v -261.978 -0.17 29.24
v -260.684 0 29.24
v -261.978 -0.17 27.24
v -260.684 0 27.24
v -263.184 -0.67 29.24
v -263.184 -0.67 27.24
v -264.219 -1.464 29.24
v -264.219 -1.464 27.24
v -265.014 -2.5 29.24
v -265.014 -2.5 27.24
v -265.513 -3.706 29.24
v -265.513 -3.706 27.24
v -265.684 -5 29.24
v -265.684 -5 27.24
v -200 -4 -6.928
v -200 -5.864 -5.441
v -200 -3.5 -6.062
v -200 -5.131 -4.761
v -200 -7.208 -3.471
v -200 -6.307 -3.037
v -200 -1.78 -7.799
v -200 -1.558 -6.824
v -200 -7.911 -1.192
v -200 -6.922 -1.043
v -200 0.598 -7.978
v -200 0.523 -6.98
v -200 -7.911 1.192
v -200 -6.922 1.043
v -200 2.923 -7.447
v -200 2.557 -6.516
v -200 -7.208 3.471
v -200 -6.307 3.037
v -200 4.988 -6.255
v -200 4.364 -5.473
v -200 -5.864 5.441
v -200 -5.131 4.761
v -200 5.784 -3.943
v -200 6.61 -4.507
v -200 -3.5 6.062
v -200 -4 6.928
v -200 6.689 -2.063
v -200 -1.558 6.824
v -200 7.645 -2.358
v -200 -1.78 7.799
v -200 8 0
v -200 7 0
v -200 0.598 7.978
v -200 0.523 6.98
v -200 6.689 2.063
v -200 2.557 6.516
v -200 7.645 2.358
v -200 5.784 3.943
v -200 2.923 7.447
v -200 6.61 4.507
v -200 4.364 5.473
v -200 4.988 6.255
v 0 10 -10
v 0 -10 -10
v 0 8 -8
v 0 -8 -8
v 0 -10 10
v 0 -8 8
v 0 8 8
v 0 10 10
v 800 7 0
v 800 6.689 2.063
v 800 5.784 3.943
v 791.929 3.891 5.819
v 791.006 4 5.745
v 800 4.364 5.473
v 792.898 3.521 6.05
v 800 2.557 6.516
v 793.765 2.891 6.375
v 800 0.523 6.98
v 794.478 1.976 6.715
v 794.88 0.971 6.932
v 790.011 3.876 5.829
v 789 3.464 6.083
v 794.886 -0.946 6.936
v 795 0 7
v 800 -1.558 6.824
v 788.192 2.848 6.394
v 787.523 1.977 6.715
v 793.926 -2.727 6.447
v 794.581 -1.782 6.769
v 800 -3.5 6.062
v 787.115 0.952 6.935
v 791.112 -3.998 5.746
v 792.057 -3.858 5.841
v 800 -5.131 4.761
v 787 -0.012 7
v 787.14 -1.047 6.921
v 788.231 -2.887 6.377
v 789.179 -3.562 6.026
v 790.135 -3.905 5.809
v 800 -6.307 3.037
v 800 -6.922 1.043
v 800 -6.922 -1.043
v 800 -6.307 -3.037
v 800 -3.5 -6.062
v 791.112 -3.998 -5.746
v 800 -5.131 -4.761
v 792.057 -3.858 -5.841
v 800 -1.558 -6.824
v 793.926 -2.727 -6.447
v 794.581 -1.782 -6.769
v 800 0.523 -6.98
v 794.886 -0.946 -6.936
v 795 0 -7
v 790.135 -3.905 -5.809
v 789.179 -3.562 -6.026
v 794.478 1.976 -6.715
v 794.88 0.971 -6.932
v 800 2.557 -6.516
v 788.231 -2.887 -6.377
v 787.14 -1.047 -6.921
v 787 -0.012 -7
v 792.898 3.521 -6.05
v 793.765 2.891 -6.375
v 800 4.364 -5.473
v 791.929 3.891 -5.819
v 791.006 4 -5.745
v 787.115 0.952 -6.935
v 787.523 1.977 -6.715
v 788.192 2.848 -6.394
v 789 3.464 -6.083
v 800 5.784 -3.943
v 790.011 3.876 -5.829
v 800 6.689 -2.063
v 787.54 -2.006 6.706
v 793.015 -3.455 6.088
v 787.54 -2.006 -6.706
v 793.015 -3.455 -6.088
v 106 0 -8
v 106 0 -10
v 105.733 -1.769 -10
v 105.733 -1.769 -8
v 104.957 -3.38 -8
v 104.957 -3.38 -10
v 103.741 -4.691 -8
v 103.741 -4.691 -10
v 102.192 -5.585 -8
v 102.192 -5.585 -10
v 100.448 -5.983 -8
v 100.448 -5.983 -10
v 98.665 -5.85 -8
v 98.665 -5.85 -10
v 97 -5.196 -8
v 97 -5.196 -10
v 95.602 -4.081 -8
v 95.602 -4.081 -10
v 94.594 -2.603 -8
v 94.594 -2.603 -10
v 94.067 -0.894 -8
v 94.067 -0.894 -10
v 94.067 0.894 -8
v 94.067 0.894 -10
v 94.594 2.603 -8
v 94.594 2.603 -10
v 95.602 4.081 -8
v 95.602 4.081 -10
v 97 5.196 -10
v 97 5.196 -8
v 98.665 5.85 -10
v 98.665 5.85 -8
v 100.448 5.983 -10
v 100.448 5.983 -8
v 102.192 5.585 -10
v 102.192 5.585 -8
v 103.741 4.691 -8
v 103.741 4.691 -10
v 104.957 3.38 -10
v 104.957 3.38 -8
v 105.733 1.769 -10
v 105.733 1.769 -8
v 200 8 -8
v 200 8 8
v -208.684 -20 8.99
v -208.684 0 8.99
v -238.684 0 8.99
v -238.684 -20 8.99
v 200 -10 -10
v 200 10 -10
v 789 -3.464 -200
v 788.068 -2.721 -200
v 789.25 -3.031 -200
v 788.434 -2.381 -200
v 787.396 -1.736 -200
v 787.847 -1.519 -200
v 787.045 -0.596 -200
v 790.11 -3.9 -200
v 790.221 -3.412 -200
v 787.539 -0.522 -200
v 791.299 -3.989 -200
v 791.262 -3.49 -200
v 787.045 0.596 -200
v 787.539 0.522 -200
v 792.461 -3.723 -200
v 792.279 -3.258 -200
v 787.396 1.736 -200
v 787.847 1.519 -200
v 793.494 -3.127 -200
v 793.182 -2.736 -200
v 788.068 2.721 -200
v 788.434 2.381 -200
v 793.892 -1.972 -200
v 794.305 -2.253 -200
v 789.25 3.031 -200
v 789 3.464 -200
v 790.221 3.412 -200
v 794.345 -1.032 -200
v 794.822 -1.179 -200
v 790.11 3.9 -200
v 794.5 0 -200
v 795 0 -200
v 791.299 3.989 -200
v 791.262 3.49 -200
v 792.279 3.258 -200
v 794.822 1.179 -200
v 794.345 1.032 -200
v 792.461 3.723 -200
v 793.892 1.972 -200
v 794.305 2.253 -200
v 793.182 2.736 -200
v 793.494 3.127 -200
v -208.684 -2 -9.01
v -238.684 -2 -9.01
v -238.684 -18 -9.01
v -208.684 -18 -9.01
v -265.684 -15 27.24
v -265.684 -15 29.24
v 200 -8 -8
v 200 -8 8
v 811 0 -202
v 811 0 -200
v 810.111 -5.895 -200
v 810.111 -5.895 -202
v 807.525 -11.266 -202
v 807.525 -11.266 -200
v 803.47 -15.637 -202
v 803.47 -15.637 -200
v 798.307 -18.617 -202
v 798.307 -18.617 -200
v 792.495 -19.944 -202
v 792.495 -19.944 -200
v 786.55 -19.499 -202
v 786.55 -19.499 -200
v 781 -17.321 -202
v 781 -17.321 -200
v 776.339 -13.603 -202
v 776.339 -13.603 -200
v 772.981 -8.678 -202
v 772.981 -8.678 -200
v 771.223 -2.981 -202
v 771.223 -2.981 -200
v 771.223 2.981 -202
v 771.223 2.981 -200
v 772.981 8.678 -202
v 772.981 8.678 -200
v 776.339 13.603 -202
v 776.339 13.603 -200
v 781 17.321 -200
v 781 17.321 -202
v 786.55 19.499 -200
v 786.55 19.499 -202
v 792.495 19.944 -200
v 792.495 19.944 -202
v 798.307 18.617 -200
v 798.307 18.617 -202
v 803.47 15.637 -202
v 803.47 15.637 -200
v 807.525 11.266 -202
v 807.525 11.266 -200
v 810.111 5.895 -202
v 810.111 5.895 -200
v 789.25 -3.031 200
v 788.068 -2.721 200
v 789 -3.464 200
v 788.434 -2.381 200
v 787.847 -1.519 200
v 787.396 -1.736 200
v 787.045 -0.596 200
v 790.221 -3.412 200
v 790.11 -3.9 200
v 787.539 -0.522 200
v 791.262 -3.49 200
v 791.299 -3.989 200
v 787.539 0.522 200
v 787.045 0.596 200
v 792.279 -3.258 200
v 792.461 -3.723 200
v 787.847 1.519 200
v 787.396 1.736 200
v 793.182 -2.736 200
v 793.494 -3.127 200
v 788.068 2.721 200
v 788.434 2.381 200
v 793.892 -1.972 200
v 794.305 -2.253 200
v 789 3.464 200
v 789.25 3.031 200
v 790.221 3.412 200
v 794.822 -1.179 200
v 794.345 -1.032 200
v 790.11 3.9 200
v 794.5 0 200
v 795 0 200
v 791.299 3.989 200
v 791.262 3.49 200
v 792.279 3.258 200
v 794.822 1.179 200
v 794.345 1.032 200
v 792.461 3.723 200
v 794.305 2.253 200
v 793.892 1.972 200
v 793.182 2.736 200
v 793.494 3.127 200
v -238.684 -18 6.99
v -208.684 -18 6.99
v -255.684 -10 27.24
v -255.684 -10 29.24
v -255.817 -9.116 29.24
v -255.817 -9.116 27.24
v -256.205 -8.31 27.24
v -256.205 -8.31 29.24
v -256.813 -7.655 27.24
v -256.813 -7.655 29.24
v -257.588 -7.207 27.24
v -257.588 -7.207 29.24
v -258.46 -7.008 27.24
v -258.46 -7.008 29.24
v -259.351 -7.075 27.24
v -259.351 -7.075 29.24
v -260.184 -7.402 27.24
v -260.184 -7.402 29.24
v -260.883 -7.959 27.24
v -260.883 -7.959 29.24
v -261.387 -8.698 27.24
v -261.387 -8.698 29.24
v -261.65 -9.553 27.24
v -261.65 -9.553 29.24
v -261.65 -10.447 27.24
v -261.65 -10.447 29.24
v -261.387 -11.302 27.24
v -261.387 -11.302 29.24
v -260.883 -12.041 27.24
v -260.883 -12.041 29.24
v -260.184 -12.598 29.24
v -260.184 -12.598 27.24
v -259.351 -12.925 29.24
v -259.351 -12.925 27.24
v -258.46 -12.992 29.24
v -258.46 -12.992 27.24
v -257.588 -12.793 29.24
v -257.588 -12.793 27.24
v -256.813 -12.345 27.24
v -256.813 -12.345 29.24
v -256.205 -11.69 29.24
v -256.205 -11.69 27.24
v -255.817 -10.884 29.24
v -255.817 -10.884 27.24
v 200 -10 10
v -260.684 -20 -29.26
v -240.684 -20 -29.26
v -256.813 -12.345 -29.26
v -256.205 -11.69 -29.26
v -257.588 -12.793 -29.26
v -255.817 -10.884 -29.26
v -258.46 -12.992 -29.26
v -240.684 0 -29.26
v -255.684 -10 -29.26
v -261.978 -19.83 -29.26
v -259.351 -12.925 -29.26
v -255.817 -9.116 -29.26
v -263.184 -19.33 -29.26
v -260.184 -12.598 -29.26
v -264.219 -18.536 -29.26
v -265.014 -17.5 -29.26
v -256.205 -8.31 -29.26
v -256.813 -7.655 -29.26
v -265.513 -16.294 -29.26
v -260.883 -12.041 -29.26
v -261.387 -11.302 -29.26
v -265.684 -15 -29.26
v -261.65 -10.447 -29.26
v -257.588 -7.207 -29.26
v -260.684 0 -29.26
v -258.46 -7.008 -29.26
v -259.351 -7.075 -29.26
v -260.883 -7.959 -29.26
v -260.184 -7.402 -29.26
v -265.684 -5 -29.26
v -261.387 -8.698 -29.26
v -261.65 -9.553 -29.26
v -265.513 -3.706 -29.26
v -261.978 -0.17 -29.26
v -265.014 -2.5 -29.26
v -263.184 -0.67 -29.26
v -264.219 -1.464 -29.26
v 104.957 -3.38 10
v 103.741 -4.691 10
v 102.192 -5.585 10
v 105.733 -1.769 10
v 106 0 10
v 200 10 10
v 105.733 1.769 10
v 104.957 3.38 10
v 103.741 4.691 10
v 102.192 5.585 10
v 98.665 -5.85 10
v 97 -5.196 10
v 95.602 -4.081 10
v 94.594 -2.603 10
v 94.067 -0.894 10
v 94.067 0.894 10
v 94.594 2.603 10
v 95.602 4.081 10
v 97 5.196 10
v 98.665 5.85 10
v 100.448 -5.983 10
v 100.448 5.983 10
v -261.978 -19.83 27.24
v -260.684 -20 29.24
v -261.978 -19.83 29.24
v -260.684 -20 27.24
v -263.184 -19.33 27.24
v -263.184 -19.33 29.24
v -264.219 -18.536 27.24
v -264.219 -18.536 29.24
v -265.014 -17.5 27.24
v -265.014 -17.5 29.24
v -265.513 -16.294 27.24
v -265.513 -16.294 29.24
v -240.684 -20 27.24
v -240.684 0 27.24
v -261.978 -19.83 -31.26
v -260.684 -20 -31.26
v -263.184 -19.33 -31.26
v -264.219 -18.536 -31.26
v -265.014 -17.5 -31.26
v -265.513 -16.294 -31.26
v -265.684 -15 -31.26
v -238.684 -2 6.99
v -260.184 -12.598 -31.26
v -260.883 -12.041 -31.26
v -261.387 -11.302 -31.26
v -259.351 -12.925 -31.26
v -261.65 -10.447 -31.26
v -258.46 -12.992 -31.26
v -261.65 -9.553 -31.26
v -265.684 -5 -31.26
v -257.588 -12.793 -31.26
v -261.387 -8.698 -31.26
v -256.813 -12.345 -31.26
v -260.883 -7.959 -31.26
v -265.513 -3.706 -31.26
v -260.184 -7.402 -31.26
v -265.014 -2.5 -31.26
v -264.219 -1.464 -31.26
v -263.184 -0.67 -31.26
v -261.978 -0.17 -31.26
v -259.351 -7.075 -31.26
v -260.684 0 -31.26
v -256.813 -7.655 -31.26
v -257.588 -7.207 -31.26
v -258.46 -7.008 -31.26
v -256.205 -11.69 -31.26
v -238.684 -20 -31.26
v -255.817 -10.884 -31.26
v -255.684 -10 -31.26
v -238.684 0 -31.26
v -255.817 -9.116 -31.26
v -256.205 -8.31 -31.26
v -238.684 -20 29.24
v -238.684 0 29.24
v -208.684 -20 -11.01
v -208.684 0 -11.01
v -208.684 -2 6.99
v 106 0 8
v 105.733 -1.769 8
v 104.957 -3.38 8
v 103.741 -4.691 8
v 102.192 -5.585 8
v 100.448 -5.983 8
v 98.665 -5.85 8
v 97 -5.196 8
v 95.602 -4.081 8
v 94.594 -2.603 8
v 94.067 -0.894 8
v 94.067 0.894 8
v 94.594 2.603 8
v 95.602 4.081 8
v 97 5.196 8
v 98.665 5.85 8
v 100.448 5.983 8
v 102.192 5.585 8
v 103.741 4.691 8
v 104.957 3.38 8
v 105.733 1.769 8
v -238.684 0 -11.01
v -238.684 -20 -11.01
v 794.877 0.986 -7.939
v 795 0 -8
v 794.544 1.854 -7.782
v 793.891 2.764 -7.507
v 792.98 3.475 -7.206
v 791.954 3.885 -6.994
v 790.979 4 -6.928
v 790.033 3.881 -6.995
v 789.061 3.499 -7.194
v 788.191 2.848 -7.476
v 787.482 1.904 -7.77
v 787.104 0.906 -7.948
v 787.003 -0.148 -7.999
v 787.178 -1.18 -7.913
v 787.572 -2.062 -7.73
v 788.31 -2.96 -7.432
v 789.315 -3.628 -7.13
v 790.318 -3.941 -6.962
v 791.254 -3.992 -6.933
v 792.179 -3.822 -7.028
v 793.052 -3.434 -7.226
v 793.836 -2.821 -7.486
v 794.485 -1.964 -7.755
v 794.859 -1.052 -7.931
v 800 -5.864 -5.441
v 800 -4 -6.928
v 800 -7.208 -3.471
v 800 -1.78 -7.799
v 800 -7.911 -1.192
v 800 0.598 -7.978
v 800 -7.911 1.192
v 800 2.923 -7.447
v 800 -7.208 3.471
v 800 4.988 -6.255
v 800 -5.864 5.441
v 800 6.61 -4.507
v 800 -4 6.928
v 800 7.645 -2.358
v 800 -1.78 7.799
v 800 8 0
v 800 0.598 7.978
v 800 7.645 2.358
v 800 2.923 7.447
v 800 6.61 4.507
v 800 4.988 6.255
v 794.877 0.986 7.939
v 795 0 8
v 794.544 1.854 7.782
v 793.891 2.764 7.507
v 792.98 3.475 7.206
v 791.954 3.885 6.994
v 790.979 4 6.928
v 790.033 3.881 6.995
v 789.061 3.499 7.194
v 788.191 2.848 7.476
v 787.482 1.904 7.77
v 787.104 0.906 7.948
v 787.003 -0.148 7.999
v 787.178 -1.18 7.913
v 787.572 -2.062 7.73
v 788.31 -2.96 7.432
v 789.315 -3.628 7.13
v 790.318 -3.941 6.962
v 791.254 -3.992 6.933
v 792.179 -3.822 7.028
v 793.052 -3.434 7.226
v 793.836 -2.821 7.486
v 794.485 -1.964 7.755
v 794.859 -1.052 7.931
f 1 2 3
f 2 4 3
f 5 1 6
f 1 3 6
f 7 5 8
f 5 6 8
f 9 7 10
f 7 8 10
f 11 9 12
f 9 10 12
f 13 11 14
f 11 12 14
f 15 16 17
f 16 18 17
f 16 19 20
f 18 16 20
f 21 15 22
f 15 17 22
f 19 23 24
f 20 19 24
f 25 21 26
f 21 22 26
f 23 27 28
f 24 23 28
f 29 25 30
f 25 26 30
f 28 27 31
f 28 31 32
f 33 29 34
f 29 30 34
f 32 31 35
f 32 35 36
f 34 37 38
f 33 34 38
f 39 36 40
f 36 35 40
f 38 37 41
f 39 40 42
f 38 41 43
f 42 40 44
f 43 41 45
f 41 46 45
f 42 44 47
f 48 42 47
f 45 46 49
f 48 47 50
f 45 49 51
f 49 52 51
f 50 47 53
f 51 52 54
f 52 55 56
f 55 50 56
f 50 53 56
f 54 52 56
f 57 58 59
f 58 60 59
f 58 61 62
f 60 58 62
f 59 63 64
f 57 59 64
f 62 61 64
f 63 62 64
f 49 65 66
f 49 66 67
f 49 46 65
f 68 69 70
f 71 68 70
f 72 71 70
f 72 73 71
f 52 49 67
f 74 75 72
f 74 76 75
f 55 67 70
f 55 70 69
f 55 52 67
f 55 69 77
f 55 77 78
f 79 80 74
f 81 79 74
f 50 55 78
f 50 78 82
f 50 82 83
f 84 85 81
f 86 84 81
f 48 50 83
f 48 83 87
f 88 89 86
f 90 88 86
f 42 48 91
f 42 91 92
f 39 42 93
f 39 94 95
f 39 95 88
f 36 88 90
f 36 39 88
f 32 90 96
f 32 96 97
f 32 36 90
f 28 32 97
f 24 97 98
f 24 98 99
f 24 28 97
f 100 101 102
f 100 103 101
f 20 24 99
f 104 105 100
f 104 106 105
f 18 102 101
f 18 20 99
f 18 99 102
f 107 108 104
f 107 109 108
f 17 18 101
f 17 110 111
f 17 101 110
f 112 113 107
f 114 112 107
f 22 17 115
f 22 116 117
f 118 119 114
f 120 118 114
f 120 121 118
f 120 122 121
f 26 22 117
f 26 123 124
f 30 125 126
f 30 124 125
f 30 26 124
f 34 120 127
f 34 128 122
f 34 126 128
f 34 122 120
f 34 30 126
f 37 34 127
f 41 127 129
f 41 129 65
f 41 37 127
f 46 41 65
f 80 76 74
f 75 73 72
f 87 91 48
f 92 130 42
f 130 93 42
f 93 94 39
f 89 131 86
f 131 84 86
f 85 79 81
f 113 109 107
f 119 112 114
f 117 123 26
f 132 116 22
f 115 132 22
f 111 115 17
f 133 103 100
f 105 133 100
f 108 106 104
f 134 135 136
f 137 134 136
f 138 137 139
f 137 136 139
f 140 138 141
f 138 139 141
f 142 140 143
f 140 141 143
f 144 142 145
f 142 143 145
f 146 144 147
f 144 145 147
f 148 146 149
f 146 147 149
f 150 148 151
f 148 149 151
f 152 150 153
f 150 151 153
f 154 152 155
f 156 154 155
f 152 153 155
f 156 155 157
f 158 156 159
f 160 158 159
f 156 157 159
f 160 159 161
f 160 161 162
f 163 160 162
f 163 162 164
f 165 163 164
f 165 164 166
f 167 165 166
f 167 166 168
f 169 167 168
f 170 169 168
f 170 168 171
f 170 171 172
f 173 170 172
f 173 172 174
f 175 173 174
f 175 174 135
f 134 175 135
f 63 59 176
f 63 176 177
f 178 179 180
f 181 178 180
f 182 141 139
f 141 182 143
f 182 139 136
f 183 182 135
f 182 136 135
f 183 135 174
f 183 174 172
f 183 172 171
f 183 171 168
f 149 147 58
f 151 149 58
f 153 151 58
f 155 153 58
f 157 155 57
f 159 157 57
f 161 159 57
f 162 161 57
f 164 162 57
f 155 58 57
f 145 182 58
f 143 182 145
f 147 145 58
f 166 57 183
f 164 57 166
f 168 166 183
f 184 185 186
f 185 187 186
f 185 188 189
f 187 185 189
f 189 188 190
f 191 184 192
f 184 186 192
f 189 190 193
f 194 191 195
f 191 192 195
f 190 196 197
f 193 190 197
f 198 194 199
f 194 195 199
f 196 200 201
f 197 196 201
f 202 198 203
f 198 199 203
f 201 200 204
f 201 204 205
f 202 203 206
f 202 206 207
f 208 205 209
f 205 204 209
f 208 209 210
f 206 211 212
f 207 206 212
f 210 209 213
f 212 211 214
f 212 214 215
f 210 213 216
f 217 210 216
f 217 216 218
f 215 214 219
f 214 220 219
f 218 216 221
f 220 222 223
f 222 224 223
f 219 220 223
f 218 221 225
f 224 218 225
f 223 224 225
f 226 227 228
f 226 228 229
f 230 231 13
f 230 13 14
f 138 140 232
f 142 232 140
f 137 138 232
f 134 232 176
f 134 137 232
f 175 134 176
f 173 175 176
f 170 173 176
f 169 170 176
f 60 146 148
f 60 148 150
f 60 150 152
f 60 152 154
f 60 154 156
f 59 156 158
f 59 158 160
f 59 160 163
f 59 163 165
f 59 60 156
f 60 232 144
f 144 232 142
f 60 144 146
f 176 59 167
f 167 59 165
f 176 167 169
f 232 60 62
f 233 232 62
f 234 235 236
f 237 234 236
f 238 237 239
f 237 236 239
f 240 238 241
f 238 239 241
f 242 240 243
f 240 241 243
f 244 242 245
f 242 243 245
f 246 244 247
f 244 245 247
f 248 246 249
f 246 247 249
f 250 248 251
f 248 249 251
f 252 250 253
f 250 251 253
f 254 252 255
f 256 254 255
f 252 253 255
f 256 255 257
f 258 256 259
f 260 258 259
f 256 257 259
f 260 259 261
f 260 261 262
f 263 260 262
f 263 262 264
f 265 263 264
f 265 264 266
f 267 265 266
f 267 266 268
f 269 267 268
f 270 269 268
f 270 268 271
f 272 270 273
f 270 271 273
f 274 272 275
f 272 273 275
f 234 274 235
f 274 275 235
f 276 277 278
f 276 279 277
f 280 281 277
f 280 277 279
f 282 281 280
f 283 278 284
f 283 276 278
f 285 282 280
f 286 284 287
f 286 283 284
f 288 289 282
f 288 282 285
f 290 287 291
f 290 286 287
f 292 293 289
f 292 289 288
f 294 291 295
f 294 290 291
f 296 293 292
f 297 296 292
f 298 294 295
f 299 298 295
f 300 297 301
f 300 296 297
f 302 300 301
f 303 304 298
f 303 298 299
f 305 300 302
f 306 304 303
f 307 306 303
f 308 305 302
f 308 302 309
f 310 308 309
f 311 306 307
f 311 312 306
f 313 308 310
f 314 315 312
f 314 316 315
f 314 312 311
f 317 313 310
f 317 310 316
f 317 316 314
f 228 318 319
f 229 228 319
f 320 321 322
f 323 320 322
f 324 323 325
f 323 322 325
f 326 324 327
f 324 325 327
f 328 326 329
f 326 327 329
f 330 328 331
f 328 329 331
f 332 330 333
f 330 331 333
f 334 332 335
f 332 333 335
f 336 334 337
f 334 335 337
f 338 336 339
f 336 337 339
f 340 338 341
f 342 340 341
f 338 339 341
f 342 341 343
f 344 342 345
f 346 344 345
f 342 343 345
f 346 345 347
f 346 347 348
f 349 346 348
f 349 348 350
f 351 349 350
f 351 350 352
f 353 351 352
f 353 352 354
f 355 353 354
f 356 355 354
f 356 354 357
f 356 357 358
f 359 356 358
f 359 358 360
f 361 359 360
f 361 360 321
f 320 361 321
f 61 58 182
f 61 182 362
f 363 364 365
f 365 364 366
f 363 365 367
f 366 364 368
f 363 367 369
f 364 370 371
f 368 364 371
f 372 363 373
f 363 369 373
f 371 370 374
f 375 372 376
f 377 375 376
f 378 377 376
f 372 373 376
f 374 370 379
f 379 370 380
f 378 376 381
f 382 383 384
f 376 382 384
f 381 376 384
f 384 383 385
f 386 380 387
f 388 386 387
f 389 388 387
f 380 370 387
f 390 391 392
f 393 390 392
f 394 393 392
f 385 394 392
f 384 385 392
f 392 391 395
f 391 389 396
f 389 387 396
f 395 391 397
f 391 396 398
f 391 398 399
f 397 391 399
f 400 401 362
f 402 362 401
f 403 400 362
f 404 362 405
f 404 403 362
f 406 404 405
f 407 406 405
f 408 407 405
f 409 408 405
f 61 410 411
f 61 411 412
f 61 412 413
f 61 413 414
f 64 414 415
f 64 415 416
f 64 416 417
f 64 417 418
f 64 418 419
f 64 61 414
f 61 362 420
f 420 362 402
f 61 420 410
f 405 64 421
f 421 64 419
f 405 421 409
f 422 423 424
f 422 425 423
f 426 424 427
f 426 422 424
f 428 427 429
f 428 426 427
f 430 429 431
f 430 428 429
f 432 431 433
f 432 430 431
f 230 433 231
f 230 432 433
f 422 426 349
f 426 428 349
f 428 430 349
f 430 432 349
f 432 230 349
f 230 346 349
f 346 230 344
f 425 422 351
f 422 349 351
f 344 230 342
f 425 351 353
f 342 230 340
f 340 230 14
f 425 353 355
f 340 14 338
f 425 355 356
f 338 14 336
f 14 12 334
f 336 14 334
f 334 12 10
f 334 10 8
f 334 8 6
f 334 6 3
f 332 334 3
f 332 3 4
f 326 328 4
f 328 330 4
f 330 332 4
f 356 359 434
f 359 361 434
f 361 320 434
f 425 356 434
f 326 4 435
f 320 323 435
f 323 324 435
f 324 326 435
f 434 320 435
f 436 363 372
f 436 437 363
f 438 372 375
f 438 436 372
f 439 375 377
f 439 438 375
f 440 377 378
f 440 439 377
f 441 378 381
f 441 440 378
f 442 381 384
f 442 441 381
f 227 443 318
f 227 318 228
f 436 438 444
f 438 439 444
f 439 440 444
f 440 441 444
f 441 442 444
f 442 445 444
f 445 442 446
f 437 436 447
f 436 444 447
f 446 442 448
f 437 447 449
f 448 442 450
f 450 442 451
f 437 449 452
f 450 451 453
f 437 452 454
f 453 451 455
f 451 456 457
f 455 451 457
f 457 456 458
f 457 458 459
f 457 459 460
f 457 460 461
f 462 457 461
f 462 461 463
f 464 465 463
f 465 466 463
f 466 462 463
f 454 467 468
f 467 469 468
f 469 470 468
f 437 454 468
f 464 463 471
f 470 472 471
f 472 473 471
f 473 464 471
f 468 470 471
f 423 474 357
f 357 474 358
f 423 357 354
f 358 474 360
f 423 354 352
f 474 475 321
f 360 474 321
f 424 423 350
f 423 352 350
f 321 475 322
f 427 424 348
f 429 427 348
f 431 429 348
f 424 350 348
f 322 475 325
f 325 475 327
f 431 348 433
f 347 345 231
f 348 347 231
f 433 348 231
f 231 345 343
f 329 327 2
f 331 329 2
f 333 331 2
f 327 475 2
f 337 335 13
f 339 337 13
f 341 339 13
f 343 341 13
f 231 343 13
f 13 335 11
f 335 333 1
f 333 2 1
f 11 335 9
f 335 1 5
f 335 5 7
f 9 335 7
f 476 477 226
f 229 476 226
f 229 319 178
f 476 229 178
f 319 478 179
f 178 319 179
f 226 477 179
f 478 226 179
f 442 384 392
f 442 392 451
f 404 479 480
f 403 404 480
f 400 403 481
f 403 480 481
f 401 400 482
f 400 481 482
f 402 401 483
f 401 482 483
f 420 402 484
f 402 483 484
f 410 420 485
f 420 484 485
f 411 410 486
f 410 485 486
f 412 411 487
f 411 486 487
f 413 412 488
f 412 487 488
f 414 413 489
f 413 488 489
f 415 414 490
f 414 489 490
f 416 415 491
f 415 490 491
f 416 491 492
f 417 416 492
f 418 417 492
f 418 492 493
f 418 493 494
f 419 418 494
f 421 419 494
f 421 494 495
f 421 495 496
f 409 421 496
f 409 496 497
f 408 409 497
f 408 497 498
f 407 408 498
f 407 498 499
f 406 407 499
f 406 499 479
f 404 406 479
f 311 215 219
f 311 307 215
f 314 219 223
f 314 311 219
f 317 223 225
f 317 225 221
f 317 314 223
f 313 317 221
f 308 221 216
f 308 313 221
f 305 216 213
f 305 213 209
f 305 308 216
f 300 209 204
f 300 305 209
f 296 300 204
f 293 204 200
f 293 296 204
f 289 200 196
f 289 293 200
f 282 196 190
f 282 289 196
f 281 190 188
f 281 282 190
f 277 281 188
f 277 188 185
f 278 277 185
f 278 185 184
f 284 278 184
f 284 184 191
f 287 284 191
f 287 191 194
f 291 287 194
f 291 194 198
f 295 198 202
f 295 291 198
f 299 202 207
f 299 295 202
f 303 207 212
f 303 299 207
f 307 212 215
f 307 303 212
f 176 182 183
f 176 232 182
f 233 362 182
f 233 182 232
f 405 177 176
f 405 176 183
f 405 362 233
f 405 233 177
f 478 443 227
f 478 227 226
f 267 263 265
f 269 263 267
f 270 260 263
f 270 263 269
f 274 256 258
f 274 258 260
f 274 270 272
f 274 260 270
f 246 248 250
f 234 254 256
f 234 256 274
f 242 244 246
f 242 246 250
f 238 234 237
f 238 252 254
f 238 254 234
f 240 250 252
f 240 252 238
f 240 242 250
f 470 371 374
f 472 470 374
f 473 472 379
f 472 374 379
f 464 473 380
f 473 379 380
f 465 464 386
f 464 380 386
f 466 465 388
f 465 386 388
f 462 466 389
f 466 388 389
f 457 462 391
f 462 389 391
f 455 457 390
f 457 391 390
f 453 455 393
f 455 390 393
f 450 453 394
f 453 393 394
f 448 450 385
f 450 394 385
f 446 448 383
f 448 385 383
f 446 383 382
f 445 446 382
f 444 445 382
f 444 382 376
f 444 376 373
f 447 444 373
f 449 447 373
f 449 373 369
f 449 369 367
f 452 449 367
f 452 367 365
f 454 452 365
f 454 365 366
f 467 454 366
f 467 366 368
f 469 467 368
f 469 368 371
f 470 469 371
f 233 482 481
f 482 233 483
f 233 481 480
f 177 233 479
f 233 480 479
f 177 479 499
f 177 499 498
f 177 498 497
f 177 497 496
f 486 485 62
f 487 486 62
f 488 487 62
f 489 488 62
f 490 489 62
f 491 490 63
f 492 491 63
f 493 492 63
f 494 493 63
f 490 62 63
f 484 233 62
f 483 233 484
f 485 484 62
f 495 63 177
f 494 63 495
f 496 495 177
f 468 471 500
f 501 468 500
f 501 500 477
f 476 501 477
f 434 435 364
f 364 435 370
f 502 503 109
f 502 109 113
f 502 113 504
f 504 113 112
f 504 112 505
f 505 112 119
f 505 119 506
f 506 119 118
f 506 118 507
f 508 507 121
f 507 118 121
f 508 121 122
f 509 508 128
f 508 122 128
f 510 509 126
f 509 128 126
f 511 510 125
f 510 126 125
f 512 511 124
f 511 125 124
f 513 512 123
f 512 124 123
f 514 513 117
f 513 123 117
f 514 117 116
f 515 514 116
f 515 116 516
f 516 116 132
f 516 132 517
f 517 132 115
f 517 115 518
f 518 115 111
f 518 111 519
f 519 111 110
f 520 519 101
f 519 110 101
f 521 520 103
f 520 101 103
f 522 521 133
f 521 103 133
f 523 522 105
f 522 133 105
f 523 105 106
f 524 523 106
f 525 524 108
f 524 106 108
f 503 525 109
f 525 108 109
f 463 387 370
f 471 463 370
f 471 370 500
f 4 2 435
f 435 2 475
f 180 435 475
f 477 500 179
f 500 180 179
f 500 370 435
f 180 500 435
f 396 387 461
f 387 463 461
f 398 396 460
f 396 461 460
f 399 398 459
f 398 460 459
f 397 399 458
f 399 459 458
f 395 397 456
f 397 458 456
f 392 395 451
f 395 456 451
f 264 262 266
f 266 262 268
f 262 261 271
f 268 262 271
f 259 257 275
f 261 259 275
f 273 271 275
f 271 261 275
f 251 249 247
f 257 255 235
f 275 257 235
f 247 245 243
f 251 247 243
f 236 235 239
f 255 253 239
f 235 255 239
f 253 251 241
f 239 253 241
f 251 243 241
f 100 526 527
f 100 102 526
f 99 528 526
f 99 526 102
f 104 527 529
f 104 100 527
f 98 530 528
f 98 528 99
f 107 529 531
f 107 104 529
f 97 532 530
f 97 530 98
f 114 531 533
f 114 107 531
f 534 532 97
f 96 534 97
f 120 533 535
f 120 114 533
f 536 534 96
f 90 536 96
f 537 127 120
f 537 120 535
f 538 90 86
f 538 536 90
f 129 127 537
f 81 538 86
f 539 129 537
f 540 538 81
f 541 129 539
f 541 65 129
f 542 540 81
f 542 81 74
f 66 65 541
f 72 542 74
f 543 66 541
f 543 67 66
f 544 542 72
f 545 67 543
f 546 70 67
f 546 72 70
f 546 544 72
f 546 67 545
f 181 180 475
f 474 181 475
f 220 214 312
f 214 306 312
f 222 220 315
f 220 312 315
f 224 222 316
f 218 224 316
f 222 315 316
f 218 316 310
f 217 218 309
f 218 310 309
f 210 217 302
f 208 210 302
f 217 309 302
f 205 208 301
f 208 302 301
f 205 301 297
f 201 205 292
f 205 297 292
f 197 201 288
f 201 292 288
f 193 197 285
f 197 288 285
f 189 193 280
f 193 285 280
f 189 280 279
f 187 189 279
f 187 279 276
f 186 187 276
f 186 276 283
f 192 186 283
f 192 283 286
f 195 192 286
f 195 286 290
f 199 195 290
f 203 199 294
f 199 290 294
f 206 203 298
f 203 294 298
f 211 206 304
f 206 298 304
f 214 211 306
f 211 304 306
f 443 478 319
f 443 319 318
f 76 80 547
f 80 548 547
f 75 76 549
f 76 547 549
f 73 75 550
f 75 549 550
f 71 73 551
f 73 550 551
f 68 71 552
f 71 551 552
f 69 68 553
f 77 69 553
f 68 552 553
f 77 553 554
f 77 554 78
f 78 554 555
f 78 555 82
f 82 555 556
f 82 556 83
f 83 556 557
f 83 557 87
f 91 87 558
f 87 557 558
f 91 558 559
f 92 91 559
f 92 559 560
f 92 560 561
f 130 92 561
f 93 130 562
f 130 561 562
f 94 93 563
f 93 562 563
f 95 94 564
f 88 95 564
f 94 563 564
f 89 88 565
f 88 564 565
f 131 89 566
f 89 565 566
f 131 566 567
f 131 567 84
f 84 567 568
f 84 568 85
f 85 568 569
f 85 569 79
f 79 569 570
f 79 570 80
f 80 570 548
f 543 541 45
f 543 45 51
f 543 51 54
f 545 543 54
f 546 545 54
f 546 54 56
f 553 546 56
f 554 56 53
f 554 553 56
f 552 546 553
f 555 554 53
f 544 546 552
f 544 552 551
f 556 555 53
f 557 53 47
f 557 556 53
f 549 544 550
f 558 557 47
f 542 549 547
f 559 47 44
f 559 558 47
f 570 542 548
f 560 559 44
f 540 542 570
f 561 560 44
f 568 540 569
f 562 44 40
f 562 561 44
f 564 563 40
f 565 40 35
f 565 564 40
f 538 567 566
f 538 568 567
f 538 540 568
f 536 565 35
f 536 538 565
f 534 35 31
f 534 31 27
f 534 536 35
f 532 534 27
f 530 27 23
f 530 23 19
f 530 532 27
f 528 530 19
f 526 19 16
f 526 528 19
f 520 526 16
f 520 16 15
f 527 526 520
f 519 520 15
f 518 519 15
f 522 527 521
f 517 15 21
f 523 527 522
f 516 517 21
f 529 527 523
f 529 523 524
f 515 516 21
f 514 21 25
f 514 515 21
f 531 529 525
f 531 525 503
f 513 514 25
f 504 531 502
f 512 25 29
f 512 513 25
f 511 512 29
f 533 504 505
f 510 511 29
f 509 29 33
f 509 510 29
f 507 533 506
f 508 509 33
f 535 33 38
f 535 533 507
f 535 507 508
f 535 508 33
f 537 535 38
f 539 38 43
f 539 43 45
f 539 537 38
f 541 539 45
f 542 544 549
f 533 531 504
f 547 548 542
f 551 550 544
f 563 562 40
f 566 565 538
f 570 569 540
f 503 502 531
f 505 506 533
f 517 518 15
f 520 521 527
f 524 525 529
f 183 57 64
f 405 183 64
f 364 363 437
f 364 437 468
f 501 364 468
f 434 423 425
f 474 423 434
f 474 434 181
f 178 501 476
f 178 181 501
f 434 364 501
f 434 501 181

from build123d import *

# Parameters (mm, degrees)
F0_W          = 20
F0_H          = 20
F0_W_2        = 16
F0_H_2        = 16
F1_DEPTH      = 200
F2_R          = 8
F2_R_2        = 7
F3_DEPTH      = 800
F3_DEPTH_BACK = 200
F4_R          = 6
F5_DEPTH      = 25
F6_R          = 4
F7_DEPTH      = 12.5
F8_DEPTH      = 200
F9_T          = -0.5
F10_R         = 20
F11_DEPTH     = 2
F13_DEPTH     = 20
F14_T         = -2
F15_R         = 3
F16_DEPTH     = 231.2414921874
F17_R         = 5


with BuildPart() as f1:
    # F0 (on Right) → F1 (new body)
    with BuildSketch(Plane.YZ):
        Rectangle(F0_W, F0_H)
        Rectangle(F0_W_2, F0_H_2, mode=Mode.SUBTRACT)
    extrude(amount=F1_DEPTH)

    # F4 (on face) → F5 (cut)
    with BuildSketch(Plane(origin=(0, 0, -10), x_dir=(1, 0, 0), z_dir=(0, 0, -1))):
        with Locations((100, 0)):
            Circle(F4_R)
    extrude(amount=-F5_DEPTH, mode=Mode.SUBTRACT)


with BuildPart() as f3:
    # F2 (on Right) → F3 (new body, two sides)
    with BuildSketch(Plane.YZ) as f3_sk:
        Circle(F2_R)
        Circle(F2_R_2, mode=Mode.SUBTRACT)
    extrude(amount=F3_DEPTH)
    extrude(f3_sk.sketch, amount=-F3_DEPTH_BACK)

    # F6 (on Top) → F7 (cut, symmetric)
    with BuildSketch(Plane.XY):
        with Locations((791, 0)):
            Circle(F6_R)
    extrude(amount=F7_DEPTH, both=True, mode=Mode.SUBTRACT)


with BuildPart() as f8:
    # F6 (on Top) → F8 (new body, symmetric)
    with BuildSketch(Plane.XY):
        with Locations((791, 0)):
            Circle(F6_R)
    extrude(amount=F8_DEPTH, both=True)

    # F9
    f9_openings = [f8.faces().sort_by_distance(p)[0] for p in [
        (791, 0, 200),
        (791, 0, -200),
    ]]
    offset(amount=F9_T, openings=f9_openings)


with BuildPart() as f11:
    # F10 (on face) → F11 (new body)
    with BuildSketch(Plane(origin=(0, 0, -200), x_dir=(1, 0, 0), z_dir=(0, 0, -1))):
        with Locations((791, 0)):
            Circle(F10_R)
    extrude(amount=F11_DEPTH)


with BuildPart() as f13:
    # F12 (on Front) → F13 (new body)
    with BuildSketch(Plane.XZ):
        Polygon((-238.6837440729, -11.0095078126), (-208.6837440729, -11.0095078126), (-208.6837440729, 8.9904921874), (-238.6837440729, 8.9904921874), (-238.6837440729, 29.2404921874), (-265.6837440729, 29.2404921874), (-265.6837440729, 27.2404921874), (-240.6837440729, 27.2404921874), (-240.6837440729, -29.2595078126), (-265.6837440729, -29.2595078126), (-265.6837440729, -31.2595078126), (-238.6837440729, -31.2595078126), align=None)
    extrude(amount=F13_DEPTH)

    # F14
    f14_openings = [f13.faces().sort_by_distance(p)[0] for p in [
        (-208.683744, -10, -1.009508),
    ]]
    offset(amount=F14_T, openings=f14_openings, kind=Kind.INTERSECTION)

    # F15 (on face) → F16 (cut, through all)
    with BuildSketch(Plane.XY.offset(29.2404921874)):
        with Locations((-258.6837440729, -10)):
            Circle(F15_R)
    extrude(amount=-F16_DEPTH, mode=Mode.SUBTRACT)

    # F17
    f17_edges = [f13.edges().sort_by_distance(p)[0] for p in [
        (-265.683744, -20, 28.240492),
        (-265.683744, 0, 28.240492),
        (-265.683744, -20, -30.259508),
        (-265.683744, 0, -30.259508),
    ]]
    fillet(f17_edges, radius=F17_R)


solid = Compound([f1.part, f3.part, f8.part, f11.part, f13.part])
